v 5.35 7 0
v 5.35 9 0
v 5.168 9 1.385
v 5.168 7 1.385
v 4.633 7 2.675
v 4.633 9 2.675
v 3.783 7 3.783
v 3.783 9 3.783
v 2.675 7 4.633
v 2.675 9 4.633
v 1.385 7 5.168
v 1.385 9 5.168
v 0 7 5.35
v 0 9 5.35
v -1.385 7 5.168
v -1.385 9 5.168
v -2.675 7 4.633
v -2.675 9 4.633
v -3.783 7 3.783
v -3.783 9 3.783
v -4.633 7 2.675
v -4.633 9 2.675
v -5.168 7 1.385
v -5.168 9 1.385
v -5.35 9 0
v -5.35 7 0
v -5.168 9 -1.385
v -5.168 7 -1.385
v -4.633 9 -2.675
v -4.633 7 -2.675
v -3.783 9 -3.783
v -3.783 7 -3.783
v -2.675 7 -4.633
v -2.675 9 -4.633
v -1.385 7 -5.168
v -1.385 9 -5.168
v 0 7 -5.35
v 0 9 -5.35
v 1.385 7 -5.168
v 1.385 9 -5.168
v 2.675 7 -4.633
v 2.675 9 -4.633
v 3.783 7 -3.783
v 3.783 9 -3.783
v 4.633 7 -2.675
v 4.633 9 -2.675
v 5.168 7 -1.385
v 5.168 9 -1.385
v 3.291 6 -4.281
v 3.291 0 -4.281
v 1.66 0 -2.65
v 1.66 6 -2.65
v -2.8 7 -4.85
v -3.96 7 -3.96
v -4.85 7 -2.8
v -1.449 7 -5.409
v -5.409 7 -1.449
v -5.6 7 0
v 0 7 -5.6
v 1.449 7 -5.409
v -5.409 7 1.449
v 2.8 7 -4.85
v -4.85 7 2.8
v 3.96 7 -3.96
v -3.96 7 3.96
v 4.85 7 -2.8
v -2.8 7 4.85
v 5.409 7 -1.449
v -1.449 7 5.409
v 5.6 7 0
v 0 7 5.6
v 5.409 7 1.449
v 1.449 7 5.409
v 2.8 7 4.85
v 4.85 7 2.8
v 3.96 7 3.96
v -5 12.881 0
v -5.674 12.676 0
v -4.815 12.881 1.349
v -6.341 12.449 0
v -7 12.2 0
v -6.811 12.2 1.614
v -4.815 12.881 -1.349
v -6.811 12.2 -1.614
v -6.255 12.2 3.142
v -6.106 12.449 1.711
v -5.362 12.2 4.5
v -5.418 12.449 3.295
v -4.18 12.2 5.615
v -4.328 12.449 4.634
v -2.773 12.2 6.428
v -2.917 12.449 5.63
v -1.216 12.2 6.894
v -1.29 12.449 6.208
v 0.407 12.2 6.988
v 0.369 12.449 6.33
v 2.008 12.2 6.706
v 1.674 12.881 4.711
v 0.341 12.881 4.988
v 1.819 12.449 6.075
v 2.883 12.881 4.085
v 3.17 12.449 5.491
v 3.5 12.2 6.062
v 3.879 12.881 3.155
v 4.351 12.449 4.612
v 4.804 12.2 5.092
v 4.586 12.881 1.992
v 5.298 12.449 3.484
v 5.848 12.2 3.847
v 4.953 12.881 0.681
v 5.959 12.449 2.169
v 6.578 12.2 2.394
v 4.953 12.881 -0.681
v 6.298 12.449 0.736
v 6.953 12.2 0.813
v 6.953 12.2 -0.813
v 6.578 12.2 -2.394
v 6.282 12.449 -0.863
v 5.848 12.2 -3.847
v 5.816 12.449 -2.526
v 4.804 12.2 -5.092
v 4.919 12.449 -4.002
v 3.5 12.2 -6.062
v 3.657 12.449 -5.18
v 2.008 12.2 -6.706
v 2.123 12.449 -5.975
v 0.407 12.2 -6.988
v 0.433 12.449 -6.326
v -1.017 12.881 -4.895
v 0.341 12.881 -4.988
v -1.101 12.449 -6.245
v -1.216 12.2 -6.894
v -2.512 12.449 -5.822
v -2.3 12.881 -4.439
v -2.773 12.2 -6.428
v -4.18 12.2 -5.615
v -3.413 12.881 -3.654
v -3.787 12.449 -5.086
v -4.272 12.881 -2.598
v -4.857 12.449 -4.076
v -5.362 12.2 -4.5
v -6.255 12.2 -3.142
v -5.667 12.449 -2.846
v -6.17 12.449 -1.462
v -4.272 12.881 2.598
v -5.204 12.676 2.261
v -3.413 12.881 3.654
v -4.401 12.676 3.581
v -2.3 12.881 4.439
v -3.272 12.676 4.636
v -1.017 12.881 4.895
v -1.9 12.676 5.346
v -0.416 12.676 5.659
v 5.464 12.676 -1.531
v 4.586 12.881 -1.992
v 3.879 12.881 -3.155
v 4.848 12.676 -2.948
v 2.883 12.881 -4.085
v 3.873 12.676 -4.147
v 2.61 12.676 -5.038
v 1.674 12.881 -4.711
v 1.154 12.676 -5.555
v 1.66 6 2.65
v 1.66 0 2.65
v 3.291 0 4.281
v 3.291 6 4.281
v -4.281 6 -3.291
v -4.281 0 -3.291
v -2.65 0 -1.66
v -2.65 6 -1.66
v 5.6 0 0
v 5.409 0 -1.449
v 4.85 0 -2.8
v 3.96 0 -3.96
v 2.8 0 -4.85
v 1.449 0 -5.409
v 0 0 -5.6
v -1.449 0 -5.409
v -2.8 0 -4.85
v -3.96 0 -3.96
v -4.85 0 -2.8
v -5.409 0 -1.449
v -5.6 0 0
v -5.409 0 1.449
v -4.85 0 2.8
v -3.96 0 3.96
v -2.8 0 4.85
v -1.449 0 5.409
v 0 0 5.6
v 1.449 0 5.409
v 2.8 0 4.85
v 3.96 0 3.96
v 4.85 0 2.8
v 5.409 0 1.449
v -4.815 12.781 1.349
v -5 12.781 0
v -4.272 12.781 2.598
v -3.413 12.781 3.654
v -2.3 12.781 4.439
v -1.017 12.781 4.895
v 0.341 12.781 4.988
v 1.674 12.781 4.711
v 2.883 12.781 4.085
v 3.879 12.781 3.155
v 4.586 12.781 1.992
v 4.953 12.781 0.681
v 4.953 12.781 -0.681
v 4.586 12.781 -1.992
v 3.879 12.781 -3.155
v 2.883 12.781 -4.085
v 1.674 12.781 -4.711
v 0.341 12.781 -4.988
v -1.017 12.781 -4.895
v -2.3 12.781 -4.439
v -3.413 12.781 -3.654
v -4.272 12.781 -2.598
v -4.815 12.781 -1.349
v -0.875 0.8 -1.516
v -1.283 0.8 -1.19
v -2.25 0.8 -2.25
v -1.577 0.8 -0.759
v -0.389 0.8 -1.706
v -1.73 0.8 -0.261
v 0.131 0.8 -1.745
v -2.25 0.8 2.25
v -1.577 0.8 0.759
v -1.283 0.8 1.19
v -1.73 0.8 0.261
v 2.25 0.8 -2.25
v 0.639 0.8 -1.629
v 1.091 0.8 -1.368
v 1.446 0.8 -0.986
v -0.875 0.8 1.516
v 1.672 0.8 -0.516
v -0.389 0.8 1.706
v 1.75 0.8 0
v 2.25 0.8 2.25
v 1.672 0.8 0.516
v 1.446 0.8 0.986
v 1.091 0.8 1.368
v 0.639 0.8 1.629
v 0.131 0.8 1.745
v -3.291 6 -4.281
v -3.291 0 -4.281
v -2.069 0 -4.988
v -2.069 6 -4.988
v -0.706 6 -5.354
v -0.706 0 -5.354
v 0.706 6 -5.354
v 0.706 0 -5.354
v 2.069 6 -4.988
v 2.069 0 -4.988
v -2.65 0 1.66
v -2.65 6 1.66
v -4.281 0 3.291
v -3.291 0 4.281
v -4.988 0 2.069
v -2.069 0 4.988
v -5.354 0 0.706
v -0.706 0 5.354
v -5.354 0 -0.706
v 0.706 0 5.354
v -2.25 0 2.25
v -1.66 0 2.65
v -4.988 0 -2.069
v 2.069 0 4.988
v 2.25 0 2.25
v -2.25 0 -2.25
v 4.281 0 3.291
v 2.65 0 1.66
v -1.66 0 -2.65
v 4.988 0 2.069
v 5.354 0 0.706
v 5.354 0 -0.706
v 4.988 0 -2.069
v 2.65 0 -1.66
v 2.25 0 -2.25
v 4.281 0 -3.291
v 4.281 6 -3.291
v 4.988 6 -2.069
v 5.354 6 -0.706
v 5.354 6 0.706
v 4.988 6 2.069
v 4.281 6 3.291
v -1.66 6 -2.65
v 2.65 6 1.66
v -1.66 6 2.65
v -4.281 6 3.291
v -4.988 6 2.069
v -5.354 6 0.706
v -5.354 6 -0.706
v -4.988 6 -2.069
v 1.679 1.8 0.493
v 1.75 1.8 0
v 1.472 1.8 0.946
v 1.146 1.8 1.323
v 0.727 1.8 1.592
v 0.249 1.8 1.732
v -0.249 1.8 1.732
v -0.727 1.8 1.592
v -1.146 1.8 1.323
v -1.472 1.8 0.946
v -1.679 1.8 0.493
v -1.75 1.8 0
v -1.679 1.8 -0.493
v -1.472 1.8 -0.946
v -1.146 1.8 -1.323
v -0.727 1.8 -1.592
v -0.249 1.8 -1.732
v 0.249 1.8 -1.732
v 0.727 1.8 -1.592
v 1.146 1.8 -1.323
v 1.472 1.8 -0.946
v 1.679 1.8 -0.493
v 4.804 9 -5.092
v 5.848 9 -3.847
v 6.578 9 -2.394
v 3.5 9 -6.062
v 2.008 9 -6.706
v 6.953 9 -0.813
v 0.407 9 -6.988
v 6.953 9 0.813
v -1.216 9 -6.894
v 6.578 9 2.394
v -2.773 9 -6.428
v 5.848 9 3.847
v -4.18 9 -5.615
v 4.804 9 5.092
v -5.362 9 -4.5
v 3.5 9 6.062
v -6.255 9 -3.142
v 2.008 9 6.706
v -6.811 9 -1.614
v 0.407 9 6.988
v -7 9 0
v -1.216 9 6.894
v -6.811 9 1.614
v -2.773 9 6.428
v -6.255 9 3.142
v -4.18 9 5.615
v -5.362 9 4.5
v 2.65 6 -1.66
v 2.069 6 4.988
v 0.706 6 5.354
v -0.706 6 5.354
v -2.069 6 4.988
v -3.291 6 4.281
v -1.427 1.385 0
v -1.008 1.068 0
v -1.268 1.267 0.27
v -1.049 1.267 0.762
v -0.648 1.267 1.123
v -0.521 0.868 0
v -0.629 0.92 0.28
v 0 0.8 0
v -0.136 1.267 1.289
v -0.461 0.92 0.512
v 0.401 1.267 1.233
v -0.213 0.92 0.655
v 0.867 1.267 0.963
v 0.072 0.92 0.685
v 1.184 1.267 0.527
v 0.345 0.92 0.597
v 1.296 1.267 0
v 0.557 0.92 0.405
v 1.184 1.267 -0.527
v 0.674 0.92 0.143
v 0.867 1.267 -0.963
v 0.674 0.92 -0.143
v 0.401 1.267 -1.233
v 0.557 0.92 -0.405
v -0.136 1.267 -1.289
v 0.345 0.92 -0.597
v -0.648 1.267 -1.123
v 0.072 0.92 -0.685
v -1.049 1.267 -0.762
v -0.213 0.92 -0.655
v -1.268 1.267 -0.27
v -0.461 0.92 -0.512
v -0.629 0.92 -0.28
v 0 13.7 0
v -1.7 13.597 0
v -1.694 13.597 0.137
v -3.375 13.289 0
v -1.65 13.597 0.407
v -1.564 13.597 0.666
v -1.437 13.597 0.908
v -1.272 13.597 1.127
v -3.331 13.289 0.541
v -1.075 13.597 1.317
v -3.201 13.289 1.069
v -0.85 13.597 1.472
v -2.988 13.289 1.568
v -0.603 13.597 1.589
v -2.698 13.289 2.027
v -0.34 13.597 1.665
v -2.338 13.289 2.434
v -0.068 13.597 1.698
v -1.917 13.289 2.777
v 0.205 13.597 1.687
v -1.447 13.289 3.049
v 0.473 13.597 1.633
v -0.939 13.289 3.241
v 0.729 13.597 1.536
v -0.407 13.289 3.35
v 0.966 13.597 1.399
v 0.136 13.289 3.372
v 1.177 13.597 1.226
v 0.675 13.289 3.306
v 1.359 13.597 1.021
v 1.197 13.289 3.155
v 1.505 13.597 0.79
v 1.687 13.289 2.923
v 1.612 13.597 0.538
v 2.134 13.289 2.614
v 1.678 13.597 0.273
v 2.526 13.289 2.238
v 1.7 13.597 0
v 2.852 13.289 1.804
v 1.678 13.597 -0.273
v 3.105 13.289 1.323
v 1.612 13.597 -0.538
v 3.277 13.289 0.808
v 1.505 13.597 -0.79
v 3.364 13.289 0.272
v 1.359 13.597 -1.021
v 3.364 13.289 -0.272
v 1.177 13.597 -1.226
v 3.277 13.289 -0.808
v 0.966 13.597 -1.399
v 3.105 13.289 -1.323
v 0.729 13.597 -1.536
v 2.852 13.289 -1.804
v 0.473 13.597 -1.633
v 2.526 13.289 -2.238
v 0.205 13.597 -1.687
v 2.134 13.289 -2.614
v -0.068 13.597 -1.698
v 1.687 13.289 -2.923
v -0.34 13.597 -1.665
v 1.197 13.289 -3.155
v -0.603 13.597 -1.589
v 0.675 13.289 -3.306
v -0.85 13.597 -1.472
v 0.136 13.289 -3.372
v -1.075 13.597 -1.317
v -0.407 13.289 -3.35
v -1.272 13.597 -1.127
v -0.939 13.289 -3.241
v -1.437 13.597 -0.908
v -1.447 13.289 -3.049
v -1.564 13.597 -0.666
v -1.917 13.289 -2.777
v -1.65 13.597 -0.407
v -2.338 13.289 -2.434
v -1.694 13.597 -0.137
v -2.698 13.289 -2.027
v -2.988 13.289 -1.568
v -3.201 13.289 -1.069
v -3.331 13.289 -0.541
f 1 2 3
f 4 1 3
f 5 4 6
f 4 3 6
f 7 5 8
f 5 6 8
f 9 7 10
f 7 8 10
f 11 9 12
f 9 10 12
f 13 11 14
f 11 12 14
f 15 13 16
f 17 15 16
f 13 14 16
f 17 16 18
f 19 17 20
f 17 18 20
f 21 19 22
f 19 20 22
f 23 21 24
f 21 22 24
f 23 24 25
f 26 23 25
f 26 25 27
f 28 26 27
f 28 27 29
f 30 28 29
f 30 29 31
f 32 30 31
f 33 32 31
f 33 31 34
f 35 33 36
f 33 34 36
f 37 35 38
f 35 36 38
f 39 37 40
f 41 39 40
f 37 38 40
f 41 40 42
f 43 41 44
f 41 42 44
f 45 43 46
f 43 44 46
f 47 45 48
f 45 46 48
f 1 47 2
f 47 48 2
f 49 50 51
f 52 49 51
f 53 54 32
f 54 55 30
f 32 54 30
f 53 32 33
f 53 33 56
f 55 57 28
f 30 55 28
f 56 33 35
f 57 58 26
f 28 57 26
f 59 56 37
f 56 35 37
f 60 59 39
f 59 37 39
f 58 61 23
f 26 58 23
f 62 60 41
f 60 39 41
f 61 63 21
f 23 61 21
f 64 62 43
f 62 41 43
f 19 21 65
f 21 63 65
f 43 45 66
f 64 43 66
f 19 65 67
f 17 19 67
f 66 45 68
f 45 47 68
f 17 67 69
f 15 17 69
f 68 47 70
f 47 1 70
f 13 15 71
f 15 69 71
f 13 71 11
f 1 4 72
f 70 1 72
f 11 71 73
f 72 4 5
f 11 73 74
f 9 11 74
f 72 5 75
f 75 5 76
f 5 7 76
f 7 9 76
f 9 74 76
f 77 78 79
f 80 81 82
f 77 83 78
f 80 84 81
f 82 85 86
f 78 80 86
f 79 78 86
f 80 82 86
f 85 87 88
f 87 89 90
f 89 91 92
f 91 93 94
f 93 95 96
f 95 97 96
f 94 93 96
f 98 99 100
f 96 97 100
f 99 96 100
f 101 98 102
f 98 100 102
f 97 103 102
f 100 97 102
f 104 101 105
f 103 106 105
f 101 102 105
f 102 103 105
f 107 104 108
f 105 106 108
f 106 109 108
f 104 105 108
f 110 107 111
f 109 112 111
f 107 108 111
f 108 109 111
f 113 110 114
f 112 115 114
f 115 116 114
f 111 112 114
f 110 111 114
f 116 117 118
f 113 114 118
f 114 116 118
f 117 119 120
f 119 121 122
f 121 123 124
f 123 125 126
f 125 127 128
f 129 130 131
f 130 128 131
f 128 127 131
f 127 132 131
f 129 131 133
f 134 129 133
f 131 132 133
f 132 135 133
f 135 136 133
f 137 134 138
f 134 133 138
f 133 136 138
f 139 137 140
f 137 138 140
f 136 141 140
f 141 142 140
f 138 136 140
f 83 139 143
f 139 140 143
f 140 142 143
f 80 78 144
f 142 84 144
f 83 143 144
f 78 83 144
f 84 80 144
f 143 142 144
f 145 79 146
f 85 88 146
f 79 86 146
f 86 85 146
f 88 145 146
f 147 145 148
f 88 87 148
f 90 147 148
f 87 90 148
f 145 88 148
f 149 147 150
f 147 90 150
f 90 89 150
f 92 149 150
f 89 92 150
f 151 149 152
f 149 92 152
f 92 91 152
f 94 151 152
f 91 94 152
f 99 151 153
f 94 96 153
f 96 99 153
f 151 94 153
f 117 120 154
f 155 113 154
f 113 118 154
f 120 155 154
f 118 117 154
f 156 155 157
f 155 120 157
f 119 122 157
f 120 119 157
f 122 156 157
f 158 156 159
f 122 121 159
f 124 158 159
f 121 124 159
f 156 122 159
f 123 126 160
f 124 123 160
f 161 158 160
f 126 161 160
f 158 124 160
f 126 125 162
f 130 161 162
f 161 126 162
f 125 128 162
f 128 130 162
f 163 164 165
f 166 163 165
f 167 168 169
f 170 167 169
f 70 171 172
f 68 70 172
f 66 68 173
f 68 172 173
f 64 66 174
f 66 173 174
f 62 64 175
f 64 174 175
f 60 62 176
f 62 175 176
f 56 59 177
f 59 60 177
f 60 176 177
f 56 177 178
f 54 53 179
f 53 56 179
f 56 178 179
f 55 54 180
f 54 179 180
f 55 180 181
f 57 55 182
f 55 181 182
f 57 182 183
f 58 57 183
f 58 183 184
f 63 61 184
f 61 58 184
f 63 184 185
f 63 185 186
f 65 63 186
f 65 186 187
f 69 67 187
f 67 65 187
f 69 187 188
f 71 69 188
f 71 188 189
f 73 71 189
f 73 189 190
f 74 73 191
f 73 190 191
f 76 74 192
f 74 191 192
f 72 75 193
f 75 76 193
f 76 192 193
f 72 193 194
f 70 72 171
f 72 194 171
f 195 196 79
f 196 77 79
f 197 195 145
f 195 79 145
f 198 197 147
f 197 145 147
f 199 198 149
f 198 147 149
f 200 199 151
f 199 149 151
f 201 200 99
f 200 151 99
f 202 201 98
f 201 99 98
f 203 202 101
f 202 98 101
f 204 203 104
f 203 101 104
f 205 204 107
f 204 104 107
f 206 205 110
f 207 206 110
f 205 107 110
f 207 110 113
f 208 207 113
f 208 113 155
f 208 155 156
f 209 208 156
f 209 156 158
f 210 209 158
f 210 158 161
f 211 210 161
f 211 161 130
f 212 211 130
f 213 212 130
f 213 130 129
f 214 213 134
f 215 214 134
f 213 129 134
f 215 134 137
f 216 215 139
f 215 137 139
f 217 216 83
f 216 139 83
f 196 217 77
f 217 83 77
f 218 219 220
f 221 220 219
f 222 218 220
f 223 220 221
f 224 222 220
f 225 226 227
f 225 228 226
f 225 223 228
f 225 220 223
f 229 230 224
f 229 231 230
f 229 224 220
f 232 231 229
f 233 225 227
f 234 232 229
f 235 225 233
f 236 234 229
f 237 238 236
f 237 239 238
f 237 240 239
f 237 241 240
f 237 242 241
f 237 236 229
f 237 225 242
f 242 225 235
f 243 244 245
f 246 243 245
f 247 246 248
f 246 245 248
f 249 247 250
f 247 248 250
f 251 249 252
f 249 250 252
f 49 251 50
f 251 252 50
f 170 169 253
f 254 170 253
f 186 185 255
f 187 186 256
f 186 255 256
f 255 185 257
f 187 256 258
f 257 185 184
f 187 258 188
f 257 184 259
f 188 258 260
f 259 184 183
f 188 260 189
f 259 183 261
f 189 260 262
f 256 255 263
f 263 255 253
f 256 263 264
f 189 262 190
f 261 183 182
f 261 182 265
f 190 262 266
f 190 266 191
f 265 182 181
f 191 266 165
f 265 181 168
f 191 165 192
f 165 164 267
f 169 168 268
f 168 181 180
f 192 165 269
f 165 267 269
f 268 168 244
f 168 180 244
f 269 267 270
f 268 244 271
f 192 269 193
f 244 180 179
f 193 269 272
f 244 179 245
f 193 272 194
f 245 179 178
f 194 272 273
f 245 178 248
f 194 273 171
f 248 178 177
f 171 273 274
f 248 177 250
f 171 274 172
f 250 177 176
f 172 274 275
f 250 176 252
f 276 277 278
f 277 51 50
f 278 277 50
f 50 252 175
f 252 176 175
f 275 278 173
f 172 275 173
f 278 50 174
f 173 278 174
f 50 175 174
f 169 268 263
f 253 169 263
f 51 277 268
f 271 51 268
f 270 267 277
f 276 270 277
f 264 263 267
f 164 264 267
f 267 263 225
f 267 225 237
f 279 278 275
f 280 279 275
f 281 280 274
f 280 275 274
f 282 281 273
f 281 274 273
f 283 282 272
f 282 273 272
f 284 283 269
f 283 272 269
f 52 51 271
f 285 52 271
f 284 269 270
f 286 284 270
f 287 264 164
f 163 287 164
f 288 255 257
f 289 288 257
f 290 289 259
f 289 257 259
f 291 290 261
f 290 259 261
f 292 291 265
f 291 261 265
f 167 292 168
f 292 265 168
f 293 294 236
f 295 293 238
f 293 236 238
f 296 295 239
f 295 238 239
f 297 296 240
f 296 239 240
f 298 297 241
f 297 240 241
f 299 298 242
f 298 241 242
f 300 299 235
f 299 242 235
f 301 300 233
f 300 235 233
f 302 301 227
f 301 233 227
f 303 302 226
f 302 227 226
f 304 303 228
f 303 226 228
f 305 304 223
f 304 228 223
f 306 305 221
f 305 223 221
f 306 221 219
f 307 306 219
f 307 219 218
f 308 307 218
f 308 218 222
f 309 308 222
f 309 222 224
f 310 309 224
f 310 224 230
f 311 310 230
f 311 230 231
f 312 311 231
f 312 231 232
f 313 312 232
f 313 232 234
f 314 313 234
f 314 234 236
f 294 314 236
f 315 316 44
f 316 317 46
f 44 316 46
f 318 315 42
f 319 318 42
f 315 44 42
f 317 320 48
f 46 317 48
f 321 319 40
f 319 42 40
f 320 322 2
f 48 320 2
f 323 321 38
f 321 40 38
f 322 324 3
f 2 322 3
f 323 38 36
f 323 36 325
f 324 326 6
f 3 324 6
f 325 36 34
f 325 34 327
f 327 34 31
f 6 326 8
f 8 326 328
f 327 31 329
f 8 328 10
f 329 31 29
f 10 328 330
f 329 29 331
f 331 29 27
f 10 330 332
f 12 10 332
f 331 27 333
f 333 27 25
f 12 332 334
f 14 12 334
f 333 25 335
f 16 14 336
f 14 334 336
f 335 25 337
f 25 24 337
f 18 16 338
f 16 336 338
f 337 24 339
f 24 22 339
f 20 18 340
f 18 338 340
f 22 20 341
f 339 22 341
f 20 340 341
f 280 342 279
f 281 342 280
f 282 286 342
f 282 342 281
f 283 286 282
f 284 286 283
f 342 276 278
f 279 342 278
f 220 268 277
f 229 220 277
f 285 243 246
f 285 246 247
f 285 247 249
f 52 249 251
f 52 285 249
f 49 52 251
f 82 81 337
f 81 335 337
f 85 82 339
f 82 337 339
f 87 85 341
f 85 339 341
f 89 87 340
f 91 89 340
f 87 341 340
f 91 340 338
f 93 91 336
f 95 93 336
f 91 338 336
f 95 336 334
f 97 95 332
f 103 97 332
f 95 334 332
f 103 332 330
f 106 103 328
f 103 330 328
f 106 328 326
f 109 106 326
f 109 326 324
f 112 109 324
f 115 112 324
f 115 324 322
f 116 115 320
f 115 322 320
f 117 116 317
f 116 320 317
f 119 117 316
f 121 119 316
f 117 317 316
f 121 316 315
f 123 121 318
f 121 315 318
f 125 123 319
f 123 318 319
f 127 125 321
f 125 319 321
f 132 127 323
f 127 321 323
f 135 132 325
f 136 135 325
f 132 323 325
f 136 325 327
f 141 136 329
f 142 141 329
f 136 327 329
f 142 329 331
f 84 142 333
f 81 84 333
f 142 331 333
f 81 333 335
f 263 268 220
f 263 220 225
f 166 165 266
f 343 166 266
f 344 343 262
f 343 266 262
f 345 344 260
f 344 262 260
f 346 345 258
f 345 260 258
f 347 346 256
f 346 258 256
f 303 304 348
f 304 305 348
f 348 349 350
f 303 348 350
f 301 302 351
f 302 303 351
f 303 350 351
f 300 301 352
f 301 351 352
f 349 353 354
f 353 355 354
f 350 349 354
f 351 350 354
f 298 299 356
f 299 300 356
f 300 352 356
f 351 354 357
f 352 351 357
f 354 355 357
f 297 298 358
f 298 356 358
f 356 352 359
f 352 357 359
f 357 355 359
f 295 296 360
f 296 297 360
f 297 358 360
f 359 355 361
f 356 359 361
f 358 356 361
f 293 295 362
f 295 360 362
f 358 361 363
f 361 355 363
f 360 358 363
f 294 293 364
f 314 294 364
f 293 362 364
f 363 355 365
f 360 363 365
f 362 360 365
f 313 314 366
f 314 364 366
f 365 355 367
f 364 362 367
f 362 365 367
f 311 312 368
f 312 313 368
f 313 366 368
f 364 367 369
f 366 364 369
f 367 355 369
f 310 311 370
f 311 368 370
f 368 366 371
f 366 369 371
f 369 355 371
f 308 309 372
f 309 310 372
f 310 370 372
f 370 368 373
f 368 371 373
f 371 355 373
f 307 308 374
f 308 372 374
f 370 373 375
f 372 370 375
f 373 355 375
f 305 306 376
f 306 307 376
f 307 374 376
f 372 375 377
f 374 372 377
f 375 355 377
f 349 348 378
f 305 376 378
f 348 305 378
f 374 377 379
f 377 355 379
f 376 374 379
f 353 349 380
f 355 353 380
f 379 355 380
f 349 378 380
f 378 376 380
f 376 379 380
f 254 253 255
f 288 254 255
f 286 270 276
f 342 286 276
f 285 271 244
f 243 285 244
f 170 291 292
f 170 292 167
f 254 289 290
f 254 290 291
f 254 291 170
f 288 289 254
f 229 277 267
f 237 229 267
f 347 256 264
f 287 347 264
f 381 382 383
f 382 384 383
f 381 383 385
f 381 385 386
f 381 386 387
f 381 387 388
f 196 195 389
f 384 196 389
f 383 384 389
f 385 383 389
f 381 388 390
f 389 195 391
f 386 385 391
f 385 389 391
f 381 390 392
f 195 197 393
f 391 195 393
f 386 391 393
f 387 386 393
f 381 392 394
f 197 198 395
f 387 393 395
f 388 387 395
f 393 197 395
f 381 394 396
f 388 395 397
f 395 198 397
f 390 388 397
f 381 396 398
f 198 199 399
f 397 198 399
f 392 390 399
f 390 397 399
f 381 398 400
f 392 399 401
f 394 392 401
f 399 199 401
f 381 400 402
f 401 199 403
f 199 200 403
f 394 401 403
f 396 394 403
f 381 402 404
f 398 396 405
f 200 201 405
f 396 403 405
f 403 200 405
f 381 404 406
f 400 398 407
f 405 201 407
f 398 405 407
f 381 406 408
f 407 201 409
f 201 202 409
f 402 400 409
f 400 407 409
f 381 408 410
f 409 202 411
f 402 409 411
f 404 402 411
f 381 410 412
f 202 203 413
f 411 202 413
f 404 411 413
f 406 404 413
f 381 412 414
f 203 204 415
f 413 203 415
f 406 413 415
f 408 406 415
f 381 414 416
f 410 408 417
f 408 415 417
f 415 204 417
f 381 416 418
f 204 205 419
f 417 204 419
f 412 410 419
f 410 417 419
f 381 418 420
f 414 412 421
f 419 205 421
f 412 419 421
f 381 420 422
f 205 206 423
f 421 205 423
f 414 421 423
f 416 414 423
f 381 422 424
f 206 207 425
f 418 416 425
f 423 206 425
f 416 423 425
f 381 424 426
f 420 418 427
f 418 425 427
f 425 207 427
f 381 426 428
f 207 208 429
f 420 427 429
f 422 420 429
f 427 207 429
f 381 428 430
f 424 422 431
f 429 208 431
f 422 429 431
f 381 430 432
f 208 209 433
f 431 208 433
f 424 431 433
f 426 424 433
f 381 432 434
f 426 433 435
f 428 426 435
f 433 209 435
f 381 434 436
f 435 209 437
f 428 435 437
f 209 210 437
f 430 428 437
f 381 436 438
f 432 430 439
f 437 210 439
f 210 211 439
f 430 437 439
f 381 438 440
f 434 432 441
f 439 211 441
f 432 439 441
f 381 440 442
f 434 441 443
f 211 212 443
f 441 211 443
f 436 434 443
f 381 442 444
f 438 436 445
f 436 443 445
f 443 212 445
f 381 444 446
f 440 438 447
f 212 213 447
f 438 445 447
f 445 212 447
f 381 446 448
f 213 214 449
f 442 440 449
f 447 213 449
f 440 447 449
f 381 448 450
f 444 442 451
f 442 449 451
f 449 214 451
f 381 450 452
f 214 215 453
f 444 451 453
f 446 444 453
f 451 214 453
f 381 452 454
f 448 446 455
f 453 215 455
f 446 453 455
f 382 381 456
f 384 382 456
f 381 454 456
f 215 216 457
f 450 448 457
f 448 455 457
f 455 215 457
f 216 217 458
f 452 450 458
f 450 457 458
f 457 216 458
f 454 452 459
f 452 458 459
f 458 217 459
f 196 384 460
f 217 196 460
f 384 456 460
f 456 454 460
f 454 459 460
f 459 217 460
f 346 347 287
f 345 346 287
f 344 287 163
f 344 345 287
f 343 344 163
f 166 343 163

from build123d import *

# Parameters (mm, degrees)
SKETCH1_R           = 5.6
BOSS_EXTRUDE1_DEPTH = 9
SKETCH4_R           = 5.6
SKETCH4_R_2         = 5.35
CUT_EXTRUDE1_DEPTH  = 2
SKETCH5_R           = 5.4
CUT_EXTRUDE3_DEPTH  = 6
BOSS_EXTRUDE2_DEPTH = 6
SKETCH7_W           = 4.5
SKETCH7_H           = 4.5
CUT_EXTRUDE4_DEPTH  = 0.8
SKETCH8_R           = 1.75
CUT_EXTRUDE5_DEPTH  = 1


with BuildPart() as part:
    # Sketch1 → Boss-Extrude1 (new body)
    with BuildSketch(Plane(origin=(0, 0, 0), x_dir=(1, 0, 0), z_dir=(0, 1, 0))):
        Circle(SKETCH1_R)
    extrude(amount=BOSS_EXTRUDE1_DEPTH)

    # Sketch2 → Revolve1 (revolve)
    with BuildSketch(Plane.XY):
        with BuildLine():
            Line((0, 9), (0, 13.7))
            ThreePointArc((0, 13.7), (-2.541861151, 13.468387517), (-5, 12.78117878))
            Line((-5, 12.78117878), (-5, 12.88117878))
            ThreePointArc((-5, 12.88117878), (-6.008472362, 12.565464979), (-7, 12.2))
            Line((-7, 12.2), (-7, 9))
            Line((-7, 9), (0, 9))
        make_face()
    revolve(axis=Axis((0, 9, 0), (0, 1, 0)))

    # Sketch4 → Cut-Extrude1 (cut)
    with BuildSketch(Plane.XZ.offset(-9)):
        Circle(SKETCH4_R)
        Circle(SKETCH4_R_2, mode=Mode.SUBTRACT)
    extrude(amount=CUT_EXTRUDE1_DEPTH, mode=Mode.SUBTRACT)

    # Sketch5 → Cut-Extrude3 (cut)
    with BuildSketch(Plane.XZ):
        Circle(SKETCH5_R)
    extrude(amount=-CUT_EXTRUDE3_DEPTH, mode=Mode.SUBTRACT)

    # Sketch6 → Boss-Extrude2 (add)
    with BuildSketch(Plane.XZ):
        with BuildLine():
            Line((3.291184257, -4.28113375), (1.660050506, -2.65))
            Line((1.660050506, -2.65), (-1.660050506, -2.65))
            Line((-1.660050506, -2.65), (-3.291184257, -4.28113375))
            ThreePointArc((-3.291184257, -4.28113375), (-3.818376618, -3.818376618), (-4.28113375, -3.291184257))
            Line((-4.28113375, -3.291184257), (-2.65, -1.660050506))
            Line((-2.65, -1.660050506), (-2.65, 1.660050506))
            Line((-2.65, 1.660050506), (-4.28113375, 3.291184257))
            ThreePointArc((-4.28113375, 3.291184257), (-3.818376618, 3.818376618), (-3.291184257, 4.28113375))
            Line((-3.291184257, 4.28113375), (-1.660050506, 2.65))
            Line((-1.660050506, 2.65), (1.660050506, 2.65))
            Line((1.660050506, 2.65), (3.291184257, 4.28113375))
            ThreePointArc((3.291184257, 4.28113375), (3.818376618, 3.818376618), (4.28113375, 3.291184257))
            Line((4.28113375, 3.291184257), (2.65, 1.660050506))
            Line((2.65, 1.660050506), (2.65, -1.660050506))
            Line((2.65, -1.660050506), (4.28113375, -3.291184257))
            ThreePointArc((4.28113375, -3.291184257), (3.818376618, -3.818376618), (3.291184257, -4.28113375))
        make_face()
    extrude(amount=-BOSS_EXTRUDE2_DEPTH)

    # Sketch7 → Cut-Extrude4 (cut)
    with BuildSketch(Plane.XZ):
        Rectangle(SKETCH7_W, SKETCH7_H)
    extrude(amount=-CUT_EXTRUDE4_DEPTH, mode=Mode.SUBTRACT)

    # Sketch8 → Cut-Extrude5 (cut)
    with BuildSketch(Plane.XZ.offset(-0.8)):
        Circle(SKETCH8_R)
    extrude(amount=-CUT_EXTRUDE5_DEPTH, mode=Mode.SUBTRACT)

    # Sketch9 → Revolve2 (revolve)
    with BuildSketch(Plane.XY):
        with BuildLine():
            Line((0, 0.8), (0, 1.8))
            Line((0, 1.8), (-1.75, 1.8))
            ThreePointArc((-1.75, 1.8), (-1.007782219, 1.067631118), (0, 0.8))
        make_face()
    revolve(axis=Axis((0, 0.8, 0), (0, 1, 0)))


solid = part.part
